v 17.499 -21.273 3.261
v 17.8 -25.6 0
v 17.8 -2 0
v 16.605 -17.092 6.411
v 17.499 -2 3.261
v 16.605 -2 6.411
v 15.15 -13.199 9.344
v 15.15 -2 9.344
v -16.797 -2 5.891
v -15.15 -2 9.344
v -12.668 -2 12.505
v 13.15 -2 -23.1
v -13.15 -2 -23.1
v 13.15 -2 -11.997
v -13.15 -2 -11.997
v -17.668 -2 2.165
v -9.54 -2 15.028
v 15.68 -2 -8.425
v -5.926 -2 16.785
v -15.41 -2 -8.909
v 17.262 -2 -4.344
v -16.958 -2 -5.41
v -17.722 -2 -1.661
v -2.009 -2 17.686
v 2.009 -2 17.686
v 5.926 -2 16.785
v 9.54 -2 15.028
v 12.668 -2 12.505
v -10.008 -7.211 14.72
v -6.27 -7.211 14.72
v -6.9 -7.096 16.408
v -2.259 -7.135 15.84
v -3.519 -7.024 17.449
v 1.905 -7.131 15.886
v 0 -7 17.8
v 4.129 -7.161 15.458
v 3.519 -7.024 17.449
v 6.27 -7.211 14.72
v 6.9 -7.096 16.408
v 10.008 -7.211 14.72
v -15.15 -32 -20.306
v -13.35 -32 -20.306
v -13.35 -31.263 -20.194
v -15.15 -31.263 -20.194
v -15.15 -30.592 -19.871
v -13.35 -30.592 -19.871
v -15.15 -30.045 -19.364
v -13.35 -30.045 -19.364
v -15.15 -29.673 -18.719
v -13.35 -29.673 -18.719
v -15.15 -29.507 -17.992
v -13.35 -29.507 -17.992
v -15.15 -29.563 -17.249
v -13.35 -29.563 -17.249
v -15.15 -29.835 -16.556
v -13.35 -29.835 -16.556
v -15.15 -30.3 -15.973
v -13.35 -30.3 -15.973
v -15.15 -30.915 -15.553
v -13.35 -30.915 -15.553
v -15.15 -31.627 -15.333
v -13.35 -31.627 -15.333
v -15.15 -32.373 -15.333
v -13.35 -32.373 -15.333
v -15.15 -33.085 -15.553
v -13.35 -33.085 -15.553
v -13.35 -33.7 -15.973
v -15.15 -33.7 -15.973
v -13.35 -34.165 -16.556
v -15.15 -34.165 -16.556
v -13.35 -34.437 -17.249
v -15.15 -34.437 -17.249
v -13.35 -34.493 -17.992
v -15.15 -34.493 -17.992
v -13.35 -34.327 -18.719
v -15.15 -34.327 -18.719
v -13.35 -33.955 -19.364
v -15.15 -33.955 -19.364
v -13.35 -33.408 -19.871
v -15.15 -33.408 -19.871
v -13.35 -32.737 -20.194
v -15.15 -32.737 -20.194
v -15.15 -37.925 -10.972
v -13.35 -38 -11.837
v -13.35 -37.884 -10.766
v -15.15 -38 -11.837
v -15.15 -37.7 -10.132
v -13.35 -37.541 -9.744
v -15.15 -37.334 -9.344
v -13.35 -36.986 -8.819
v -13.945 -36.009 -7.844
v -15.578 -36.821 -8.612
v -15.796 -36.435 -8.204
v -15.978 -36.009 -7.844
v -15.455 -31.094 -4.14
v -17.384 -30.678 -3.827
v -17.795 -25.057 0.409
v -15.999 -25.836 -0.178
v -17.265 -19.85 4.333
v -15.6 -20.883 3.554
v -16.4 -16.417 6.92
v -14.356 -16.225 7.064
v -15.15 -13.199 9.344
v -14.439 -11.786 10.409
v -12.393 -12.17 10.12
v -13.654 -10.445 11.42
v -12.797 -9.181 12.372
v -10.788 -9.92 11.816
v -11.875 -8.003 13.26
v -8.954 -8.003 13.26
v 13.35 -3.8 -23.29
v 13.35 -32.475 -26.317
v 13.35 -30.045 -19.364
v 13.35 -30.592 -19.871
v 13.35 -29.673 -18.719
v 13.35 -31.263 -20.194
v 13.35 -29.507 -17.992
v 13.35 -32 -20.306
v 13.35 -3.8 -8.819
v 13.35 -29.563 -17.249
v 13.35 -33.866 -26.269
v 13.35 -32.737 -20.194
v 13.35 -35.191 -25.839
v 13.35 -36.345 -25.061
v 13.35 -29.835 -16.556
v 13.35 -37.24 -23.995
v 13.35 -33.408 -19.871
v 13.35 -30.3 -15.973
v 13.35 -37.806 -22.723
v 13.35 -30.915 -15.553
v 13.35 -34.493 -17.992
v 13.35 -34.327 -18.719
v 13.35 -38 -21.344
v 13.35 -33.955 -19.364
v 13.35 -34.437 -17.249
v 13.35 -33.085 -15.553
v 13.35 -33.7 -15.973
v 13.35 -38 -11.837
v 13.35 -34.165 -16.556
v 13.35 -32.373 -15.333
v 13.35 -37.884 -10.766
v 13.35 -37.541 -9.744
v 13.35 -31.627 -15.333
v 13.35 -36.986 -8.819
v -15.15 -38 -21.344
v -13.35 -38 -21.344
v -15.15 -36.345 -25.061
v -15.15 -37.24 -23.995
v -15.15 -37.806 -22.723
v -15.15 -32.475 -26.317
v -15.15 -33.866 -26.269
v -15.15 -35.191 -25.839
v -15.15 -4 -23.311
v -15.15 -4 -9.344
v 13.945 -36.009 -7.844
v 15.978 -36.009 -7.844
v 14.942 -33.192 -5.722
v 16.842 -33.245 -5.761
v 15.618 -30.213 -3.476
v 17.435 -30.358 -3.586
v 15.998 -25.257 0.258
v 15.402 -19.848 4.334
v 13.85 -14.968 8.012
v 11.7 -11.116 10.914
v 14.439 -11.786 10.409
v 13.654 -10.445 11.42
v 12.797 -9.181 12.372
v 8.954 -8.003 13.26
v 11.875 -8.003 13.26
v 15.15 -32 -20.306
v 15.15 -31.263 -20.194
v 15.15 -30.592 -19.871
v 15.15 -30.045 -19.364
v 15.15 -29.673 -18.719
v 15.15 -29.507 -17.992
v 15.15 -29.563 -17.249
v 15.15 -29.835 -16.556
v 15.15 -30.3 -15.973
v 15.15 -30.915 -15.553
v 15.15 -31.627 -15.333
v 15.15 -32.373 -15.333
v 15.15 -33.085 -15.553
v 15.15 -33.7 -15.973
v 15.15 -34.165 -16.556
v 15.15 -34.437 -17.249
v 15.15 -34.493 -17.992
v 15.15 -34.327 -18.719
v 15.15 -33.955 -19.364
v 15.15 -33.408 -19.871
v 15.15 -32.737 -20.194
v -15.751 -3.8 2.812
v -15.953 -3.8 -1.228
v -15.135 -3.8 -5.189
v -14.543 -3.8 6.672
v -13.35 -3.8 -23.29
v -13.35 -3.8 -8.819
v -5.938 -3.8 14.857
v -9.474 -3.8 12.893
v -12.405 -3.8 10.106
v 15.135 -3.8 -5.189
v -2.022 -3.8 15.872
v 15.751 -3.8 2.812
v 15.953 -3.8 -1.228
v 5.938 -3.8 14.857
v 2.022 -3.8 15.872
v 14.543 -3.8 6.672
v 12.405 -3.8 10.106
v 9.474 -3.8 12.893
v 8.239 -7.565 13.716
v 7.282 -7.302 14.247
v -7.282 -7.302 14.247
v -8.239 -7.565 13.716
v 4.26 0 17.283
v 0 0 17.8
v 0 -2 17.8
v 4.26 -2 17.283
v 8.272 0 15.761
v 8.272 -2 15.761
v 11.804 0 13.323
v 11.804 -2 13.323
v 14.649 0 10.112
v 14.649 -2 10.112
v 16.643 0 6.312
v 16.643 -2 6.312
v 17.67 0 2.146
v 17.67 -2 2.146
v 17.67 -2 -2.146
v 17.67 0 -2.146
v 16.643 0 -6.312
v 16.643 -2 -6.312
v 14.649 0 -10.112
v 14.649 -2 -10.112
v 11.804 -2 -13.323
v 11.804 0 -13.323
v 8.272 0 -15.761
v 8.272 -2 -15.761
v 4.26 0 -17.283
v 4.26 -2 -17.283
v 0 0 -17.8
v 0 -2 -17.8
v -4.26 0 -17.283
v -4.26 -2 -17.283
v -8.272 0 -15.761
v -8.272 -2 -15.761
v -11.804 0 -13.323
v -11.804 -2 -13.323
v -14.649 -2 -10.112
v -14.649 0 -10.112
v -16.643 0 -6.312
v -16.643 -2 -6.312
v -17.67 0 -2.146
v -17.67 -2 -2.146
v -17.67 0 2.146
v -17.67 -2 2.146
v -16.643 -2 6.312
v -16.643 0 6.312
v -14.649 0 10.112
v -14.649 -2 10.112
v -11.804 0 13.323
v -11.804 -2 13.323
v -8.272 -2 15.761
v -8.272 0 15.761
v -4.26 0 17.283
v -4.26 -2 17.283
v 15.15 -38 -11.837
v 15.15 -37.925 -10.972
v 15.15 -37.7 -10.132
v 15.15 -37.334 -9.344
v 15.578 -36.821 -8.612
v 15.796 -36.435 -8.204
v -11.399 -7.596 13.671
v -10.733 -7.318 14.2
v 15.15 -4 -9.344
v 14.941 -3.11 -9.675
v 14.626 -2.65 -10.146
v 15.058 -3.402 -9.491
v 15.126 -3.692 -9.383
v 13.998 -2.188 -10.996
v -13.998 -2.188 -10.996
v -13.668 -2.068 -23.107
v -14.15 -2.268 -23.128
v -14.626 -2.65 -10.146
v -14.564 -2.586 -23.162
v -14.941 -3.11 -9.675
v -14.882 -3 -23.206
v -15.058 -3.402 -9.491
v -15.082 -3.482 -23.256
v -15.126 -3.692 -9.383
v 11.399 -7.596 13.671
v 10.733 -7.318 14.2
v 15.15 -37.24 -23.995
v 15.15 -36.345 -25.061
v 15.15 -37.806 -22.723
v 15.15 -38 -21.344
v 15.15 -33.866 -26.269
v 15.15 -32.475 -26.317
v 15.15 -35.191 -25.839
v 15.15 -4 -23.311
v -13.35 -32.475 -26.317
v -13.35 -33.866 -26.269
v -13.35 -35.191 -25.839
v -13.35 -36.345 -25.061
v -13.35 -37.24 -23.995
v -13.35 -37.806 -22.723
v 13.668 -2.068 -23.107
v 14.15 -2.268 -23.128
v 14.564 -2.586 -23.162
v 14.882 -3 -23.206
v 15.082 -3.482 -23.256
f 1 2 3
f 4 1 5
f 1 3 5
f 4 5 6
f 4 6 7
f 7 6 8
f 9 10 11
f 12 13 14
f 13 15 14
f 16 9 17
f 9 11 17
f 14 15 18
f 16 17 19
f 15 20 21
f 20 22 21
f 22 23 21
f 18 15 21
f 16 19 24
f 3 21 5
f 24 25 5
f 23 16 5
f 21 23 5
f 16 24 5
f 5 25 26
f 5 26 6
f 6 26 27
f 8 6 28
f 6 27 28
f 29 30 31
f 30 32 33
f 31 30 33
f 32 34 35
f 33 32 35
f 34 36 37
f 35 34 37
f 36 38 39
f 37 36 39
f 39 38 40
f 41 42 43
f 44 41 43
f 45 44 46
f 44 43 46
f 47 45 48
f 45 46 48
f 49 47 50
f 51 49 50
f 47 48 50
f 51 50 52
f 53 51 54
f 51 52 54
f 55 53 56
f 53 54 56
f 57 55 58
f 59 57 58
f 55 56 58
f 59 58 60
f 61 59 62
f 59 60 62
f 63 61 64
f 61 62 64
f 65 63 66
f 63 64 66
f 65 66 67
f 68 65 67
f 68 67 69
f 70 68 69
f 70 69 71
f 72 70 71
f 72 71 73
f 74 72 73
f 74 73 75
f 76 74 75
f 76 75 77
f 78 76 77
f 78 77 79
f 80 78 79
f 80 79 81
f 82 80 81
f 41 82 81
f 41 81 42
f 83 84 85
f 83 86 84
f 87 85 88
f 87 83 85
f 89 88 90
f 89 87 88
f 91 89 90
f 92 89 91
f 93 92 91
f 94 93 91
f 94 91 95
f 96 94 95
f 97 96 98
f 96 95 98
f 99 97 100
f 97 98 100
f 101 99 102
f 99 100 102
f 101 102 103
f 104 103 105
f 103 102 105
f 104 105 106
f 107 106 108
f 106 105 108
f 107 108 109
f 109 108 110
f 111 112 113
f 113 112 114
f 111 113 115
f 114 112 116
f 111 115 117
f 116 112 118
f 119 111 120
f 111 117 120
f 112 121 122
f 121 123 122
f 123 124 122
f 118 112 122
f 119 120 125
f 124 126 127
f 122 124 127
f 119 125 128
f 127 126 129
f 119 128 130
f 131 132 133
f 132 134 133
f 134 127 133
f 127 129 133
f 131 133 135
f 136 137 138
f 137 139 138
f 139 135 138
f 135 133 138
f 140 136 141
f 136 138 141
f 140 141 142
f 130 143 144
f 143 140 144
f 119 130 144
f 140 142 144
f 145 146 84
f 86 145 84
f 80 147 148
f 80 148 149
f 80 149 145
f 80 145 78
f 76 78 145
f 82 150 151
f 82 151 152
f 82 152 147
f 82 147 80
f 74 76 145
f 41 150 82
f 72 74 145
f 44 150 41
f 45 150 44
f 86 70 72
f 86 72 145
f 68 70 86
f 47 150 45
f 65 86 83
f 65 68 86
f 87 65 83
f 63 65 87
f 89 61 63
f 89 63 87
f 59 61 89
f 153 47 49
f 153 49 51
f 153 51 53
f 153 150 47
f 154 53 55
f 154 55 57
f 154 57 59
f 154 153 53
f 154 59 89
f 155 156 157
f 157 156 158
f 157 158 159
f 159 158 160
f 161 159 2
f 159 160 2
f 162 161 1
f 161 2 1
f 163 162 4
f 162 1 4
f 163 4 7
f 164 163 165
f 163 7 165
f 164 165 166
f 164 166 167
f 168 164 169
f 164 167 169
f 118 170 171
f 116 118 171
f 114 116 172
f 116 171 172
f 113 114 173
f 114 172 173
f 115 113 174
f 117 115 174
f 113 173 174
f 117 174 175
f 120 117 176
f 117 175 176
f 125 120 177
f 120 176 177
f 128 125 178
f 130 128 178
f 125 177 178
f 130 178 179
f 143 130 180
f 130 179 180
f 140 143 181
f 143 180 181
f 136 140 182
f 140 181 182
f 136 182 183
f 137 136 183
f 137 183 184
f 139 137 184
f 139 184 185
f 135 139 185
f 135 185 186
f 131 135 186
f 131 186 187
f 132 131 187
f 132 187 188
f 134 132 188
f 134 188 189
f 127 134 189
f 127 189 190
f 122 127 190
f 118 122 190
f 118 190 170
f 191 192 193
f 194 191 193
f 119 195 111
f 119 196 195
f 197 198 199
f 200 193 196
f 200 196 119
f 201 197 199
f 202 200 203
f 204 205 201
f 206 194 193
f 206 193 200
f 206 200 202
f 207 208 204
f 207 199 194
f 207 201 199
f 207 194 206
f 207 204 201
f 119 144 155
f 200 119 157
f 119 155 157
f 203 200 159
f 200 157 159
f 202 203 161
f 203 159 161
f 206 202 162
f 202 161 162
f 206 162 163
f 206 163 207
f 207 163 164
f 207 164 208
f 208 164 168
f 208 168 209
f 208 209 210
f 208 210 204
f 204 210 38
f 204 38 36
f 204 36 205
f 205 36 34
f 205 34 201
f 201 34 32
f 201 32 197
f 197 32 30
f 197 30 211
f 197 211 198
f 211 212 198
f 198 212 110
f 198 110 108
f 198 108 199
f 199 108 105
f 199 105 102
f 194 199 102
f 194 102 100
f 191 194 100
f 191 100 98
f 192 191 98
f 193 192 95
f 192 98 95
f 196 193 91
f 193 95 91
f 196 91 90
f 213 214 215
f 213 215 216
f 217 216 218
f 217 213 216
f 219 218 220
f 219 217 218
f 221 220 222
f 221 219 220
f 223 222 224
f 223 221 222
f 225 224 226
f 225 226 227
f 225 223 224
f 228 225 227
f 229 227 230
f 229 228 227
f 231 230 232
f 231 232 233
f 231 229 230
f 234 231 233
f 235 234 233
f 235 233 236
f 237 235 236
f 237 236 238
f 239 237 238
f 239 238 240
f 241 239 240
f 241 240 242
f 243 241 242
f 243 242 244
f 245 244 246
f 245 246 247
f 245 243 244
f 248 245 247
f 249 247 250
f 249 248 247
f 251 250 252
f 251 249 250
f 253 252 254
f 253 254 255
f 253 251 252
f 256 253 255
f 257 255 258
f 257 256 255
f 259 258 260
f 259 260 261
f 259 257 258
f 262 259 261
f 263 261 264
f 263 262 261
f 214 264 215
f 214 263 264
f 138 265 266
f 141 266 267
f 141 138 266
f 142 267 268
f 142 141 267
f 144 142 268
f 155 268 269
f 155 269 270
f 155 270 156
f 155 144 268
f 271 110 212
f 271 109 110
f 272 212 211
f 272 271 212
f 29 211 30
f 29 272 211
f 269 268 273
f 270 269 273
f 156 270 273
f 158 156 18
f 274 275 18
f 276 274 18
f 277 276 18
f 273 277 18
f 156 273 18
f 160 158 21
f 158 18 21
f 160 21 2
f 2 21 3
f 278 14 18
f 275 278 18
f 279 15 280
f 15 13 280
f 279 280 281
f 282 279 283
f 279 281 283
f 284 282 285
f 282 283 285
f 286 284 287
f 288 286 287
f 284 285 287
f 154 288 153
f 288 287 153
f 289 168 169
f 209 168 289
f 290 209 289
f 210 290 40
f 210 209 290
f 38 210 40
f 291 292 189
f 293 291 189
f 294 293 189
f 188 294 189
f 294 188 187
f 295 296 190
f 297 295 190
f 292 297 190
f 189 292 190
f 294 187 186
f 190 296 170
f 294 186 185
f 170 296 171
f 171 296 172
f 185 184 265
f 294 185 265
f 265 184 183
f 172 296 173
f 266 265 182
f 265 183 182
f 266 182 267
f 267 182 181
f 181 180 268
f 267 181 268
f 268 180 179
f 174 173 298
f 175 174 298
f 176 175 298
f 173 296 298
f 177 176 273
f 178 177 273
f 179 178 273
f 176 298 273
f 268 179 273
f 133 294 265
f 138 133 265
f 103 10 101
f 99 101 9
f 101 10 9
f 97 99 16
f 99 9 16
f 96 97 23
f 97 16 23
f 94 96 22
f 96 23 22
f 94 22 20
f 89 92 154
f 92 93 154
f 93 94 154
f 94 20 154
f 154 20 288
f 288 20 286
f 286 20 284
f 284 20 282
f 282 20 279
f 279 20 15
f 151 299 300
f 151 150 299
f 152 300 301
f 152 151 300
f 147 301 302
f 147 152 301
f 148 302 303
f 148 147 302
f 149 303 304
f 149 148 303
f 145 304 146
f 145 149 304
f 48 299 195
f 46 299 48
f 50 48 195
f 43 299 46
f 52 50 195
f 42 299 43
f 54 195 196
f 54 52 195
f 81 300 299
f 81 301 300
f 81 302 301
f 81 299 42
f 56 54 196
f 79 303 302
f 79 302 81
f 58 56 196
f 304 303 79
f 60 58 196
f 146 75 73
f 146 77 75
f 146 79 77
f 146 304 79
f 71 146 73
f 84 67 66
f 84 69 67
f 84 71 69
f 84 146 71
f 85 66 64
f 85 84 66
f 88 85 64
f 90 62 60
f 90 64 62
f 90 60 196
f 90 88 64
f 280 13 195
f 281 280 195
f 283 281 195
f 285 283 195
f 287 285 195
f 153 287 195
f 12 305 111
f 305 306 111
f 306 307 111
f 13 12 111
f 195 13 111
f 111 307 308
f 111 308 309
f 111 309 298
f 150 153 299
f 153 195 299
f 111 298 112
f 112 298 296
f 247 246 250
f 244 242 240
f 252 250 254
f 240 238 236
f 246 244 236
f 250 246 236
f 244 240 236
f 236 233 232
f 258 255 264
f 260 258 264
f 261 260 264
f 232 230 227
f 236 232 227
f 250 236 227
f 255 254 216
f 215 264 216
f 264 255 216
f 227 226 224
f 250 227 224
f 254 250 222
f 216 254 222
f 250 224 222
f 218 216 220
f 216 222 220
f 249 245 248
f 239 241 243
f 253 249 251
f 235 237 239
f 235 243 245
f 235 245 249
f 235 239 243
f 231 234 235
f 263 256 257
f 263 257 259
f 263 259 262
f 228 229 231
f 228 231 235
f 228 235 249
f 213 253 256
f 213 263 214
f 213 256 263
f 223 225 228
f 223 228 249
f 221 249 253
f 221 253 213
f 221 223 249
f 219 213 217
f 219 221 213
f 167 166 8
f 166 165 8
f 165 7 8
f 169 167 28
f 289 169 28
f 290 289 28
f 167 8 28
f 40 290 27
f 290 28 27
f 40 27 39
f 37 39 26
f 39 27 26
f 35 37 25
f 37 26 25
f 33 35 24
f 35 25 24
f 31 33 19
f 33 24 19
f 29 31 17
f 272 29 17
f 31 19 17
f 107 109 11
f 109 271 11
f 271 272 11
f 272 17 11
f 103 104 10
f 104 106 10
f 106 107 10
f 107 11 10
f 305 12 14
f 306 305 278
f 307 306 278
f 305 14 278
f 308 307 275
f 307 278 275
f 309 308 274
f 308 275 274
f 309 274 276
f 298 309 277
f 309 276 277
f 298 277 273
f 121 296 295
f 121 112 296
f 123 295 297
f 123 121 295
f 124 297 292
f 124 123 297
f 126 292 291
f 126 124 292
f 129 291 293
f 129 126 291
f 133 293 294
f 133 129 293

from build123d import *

# Parameters (mm, degrees)
SKETCH1_R           = 17.8
BOSS_EXTRUDE1_DEPTH = 2
BOSS_EXTRUDE2_DEPTH = 36
SKETCH3_W           = 26.7
SKETCH3_H           = 1.8
CUT_EXTRUDE1_DEPTH  = 34.2
CUT_EXTRUDE2_DEPTH  = 57.964638154
BOSS_EXTRUDE3_DEPTH = 30.3
SKETCH6_W           = 26.7
SKETCH6_H           = 3.8
CUT_EXTRUDE3_DEPTH  = 34.2
CUT_EXTRUDE4_REACH  = 59.038
SKETCH7_R           = 2.5
FILLET1_R           = 2
FILLET2_R           = 5
FILLET3_R           = 5


with BuildPart() as part:
    # Sketch1 → Boss-Extrude1 (new body)
    with BuildSketch(Plane(origin=(0, 0, 0), x_dir=(1, 0, 0), z_dir=(0, 1, 0))):
        with Locations(Location((0, 0, 0), (0, 0, 270))):
            Circle(SKETCH1_R)
    extrude(amount=-BOSS_EXTRUDE1_DEPTH)


with BuildPart() as body_2:
    # Sketch2 → Boss-Extrude2 (new body)
    with BuildSketch(Plane.XZ.offset(2)):
        with BuildLine():
            ThreePointArc((17.8, 0), (17.124689778, 4.856439025), (15.15, 9.34438334))
            Line((15.15, 9.34438334), (15.15, -9.34438334))
            ThreePointArc((15.15, -9.34438334), (17.124689778, -4.856439025), (17.8, 0))
        make_face()
        with BuildLine():
            ThreePointArc((15.15, 9.34438334), (0, 17.8), (-15.15, 9.34438334))
            Line((-15.15, 9.34438334), (-15.15, -9.34438334))
            ThreePointArc((-15.15, -9.34438334), (0, -17.8), (15.15, -9.34438334))
            Line((15.15, -9.34438334), (15.15, 9.34438334))
        make_face()
        with BuildLine():
            ThreePointArc((15.15, -9.34438334), (0, -17.8), (-15.15, -9.34438334))
            Line((-15.15, -9.34438334), (-15.15, -23.1))
            Line((-15.15, -23.1), (15.15, -23.1))
            Line((15.15, -23.1), (15.15, -9.34438334))
        make_face()
        with BuildLine():
            Line((-15.15, -9.34438334), (-15.15, 9.34438334))
            ThreePointArc((-15.15, 9.34438334), (-17.8, 0), (-15.15, -9.34438334))
        make_face()
    extrude(amount=BOSS_EXTRUDE2_DEPTH)

    # Sketch3 → Cut-Extrude1 (cut)
    with BuildSketch(Plane.XZ.offset(38)):
        with BuildLine():
            Line((13.35, -21.3), (13.35, -8.819155288))
            ThreePointArc((13.35, -8.819155288), (0, 16), (-13.35, -8.819155288))
            Line((-13.35, -8.819155288), (-13.35, -21.3))
            Line((-13.35, -21.3), (13.35, -21.3))
        make_face()
        with Locations((0, -22.2)):
            Rectangle(SKETCH3_W, SKETCH3_H)
    extrude(amount=-CUT_EXTRUDE1_DEPTH, mode=Mode.SUBTRACT)

    # Sketch4 → Cut-Extrude2 (cut, through all)
    with BuildSketch(Plane(origin=(17.8, 0, 0), x_dir=(0, 0, -1), z_dir=(1, 0, 0))):
        Polygon((-17.8, -7), (-17.8, -38), (9.34438334, -38), (-13.809389095, -7.27390619), align=None)
    extrude(amount=-CUT_EXTRUDE2_DEPTH, mode=Mode.SUBTRACT)

    # Sketch5 → Boss-Extrude3 (add)
    with BuildSketch(Plane(origin=(15.15, 0, 0), x_dir=(0, 0, -1), z_dir=(1, 0, 0))):
        Polygon((23.1, -2), (26.9, -38), (23.1, -38), align=None)
    extrude(amount=-BOSS_EXTRUDE3_DEPTH)

    # Sketch6 → Cut-Extrude3 (cut)
    with BuildSketch(Plane.XZ.offset(38)):
        with Locations((0, -25)):
            Rectangle(SKETCH6_W, SKETCH6_H)
    extrude(amount=-CUT_EXTRUDE3_DEPTH, mode=Mode.SUBTRACT)

    # Cut-Extrude4: up to this face of the body (flat: up to its plane)
    cut_extrude4_end = Plane(body_2.part.faces().sort_by_distance((-15.15, -20.728173169, -17.210623032))[0])
    # Sketch7 → Cut-Extrude4 (cut, up to the picked face)
    with BuildSketch(Plane(origin=(15.15, 0, 0), x_dir=(0, 0, -1), z_dir=(1, 0, 0)), mode=Mode.PRIVATE) as cut_extrude4_sk1:
        with Locations((17.805525003, -32)):
            Circle(SKETCH7_R)
    cut_extrude4_tool1 = split(extrude(cut_extrude4_sk1.sketch, amount=-CUT_EXTRUDE4_REACH, mode=Mode.PRIVATE), bisect_by=cut_extrude4_end, keep=Keep.BOTH, mode=Mode.PRIVATE)
    add(cut_extrude4_tool1.solids().sort_by(Axis((15.15, -32, -17.805525), (-1, 0, 0)))[0], mode=Mode.SUBTRACT)

    # Fillet1
    fillet1_edges = [body_2.edges().sort_by_distance(p)[0] for p in [
        (-9.656065145, -7.27390619, 13.809389095),
        (9.656065145, -7.27390619, 13.809389095),
        (-15.15, -2, -16.22219167),
        (15.15, -2, -16.22219167),
    ]]
    fillet(fillet1_edges, radius=FILLET1_R)

    # Fillet2
    fillet2_edges = [body_2.edges().sort_by_distance(p)[0] for p in [
        (-14.25, -38, -26.9),
        (14.25, -38, -26.9),
    ]]
    fillet(fillet2_edges, radius=FILLET2_R)

    # Fillet3
    fillet3_edges = [body_2.edges().sort_by_distance(p)[0] for p in [
        (14.25, -38, -9.34438334),
        (-14.25, -38, -9.34438334),
    ]]
    fillet(fillet3_edges, radius=FILLET3_R)


solid = Compound([part.part, body_2.part])
